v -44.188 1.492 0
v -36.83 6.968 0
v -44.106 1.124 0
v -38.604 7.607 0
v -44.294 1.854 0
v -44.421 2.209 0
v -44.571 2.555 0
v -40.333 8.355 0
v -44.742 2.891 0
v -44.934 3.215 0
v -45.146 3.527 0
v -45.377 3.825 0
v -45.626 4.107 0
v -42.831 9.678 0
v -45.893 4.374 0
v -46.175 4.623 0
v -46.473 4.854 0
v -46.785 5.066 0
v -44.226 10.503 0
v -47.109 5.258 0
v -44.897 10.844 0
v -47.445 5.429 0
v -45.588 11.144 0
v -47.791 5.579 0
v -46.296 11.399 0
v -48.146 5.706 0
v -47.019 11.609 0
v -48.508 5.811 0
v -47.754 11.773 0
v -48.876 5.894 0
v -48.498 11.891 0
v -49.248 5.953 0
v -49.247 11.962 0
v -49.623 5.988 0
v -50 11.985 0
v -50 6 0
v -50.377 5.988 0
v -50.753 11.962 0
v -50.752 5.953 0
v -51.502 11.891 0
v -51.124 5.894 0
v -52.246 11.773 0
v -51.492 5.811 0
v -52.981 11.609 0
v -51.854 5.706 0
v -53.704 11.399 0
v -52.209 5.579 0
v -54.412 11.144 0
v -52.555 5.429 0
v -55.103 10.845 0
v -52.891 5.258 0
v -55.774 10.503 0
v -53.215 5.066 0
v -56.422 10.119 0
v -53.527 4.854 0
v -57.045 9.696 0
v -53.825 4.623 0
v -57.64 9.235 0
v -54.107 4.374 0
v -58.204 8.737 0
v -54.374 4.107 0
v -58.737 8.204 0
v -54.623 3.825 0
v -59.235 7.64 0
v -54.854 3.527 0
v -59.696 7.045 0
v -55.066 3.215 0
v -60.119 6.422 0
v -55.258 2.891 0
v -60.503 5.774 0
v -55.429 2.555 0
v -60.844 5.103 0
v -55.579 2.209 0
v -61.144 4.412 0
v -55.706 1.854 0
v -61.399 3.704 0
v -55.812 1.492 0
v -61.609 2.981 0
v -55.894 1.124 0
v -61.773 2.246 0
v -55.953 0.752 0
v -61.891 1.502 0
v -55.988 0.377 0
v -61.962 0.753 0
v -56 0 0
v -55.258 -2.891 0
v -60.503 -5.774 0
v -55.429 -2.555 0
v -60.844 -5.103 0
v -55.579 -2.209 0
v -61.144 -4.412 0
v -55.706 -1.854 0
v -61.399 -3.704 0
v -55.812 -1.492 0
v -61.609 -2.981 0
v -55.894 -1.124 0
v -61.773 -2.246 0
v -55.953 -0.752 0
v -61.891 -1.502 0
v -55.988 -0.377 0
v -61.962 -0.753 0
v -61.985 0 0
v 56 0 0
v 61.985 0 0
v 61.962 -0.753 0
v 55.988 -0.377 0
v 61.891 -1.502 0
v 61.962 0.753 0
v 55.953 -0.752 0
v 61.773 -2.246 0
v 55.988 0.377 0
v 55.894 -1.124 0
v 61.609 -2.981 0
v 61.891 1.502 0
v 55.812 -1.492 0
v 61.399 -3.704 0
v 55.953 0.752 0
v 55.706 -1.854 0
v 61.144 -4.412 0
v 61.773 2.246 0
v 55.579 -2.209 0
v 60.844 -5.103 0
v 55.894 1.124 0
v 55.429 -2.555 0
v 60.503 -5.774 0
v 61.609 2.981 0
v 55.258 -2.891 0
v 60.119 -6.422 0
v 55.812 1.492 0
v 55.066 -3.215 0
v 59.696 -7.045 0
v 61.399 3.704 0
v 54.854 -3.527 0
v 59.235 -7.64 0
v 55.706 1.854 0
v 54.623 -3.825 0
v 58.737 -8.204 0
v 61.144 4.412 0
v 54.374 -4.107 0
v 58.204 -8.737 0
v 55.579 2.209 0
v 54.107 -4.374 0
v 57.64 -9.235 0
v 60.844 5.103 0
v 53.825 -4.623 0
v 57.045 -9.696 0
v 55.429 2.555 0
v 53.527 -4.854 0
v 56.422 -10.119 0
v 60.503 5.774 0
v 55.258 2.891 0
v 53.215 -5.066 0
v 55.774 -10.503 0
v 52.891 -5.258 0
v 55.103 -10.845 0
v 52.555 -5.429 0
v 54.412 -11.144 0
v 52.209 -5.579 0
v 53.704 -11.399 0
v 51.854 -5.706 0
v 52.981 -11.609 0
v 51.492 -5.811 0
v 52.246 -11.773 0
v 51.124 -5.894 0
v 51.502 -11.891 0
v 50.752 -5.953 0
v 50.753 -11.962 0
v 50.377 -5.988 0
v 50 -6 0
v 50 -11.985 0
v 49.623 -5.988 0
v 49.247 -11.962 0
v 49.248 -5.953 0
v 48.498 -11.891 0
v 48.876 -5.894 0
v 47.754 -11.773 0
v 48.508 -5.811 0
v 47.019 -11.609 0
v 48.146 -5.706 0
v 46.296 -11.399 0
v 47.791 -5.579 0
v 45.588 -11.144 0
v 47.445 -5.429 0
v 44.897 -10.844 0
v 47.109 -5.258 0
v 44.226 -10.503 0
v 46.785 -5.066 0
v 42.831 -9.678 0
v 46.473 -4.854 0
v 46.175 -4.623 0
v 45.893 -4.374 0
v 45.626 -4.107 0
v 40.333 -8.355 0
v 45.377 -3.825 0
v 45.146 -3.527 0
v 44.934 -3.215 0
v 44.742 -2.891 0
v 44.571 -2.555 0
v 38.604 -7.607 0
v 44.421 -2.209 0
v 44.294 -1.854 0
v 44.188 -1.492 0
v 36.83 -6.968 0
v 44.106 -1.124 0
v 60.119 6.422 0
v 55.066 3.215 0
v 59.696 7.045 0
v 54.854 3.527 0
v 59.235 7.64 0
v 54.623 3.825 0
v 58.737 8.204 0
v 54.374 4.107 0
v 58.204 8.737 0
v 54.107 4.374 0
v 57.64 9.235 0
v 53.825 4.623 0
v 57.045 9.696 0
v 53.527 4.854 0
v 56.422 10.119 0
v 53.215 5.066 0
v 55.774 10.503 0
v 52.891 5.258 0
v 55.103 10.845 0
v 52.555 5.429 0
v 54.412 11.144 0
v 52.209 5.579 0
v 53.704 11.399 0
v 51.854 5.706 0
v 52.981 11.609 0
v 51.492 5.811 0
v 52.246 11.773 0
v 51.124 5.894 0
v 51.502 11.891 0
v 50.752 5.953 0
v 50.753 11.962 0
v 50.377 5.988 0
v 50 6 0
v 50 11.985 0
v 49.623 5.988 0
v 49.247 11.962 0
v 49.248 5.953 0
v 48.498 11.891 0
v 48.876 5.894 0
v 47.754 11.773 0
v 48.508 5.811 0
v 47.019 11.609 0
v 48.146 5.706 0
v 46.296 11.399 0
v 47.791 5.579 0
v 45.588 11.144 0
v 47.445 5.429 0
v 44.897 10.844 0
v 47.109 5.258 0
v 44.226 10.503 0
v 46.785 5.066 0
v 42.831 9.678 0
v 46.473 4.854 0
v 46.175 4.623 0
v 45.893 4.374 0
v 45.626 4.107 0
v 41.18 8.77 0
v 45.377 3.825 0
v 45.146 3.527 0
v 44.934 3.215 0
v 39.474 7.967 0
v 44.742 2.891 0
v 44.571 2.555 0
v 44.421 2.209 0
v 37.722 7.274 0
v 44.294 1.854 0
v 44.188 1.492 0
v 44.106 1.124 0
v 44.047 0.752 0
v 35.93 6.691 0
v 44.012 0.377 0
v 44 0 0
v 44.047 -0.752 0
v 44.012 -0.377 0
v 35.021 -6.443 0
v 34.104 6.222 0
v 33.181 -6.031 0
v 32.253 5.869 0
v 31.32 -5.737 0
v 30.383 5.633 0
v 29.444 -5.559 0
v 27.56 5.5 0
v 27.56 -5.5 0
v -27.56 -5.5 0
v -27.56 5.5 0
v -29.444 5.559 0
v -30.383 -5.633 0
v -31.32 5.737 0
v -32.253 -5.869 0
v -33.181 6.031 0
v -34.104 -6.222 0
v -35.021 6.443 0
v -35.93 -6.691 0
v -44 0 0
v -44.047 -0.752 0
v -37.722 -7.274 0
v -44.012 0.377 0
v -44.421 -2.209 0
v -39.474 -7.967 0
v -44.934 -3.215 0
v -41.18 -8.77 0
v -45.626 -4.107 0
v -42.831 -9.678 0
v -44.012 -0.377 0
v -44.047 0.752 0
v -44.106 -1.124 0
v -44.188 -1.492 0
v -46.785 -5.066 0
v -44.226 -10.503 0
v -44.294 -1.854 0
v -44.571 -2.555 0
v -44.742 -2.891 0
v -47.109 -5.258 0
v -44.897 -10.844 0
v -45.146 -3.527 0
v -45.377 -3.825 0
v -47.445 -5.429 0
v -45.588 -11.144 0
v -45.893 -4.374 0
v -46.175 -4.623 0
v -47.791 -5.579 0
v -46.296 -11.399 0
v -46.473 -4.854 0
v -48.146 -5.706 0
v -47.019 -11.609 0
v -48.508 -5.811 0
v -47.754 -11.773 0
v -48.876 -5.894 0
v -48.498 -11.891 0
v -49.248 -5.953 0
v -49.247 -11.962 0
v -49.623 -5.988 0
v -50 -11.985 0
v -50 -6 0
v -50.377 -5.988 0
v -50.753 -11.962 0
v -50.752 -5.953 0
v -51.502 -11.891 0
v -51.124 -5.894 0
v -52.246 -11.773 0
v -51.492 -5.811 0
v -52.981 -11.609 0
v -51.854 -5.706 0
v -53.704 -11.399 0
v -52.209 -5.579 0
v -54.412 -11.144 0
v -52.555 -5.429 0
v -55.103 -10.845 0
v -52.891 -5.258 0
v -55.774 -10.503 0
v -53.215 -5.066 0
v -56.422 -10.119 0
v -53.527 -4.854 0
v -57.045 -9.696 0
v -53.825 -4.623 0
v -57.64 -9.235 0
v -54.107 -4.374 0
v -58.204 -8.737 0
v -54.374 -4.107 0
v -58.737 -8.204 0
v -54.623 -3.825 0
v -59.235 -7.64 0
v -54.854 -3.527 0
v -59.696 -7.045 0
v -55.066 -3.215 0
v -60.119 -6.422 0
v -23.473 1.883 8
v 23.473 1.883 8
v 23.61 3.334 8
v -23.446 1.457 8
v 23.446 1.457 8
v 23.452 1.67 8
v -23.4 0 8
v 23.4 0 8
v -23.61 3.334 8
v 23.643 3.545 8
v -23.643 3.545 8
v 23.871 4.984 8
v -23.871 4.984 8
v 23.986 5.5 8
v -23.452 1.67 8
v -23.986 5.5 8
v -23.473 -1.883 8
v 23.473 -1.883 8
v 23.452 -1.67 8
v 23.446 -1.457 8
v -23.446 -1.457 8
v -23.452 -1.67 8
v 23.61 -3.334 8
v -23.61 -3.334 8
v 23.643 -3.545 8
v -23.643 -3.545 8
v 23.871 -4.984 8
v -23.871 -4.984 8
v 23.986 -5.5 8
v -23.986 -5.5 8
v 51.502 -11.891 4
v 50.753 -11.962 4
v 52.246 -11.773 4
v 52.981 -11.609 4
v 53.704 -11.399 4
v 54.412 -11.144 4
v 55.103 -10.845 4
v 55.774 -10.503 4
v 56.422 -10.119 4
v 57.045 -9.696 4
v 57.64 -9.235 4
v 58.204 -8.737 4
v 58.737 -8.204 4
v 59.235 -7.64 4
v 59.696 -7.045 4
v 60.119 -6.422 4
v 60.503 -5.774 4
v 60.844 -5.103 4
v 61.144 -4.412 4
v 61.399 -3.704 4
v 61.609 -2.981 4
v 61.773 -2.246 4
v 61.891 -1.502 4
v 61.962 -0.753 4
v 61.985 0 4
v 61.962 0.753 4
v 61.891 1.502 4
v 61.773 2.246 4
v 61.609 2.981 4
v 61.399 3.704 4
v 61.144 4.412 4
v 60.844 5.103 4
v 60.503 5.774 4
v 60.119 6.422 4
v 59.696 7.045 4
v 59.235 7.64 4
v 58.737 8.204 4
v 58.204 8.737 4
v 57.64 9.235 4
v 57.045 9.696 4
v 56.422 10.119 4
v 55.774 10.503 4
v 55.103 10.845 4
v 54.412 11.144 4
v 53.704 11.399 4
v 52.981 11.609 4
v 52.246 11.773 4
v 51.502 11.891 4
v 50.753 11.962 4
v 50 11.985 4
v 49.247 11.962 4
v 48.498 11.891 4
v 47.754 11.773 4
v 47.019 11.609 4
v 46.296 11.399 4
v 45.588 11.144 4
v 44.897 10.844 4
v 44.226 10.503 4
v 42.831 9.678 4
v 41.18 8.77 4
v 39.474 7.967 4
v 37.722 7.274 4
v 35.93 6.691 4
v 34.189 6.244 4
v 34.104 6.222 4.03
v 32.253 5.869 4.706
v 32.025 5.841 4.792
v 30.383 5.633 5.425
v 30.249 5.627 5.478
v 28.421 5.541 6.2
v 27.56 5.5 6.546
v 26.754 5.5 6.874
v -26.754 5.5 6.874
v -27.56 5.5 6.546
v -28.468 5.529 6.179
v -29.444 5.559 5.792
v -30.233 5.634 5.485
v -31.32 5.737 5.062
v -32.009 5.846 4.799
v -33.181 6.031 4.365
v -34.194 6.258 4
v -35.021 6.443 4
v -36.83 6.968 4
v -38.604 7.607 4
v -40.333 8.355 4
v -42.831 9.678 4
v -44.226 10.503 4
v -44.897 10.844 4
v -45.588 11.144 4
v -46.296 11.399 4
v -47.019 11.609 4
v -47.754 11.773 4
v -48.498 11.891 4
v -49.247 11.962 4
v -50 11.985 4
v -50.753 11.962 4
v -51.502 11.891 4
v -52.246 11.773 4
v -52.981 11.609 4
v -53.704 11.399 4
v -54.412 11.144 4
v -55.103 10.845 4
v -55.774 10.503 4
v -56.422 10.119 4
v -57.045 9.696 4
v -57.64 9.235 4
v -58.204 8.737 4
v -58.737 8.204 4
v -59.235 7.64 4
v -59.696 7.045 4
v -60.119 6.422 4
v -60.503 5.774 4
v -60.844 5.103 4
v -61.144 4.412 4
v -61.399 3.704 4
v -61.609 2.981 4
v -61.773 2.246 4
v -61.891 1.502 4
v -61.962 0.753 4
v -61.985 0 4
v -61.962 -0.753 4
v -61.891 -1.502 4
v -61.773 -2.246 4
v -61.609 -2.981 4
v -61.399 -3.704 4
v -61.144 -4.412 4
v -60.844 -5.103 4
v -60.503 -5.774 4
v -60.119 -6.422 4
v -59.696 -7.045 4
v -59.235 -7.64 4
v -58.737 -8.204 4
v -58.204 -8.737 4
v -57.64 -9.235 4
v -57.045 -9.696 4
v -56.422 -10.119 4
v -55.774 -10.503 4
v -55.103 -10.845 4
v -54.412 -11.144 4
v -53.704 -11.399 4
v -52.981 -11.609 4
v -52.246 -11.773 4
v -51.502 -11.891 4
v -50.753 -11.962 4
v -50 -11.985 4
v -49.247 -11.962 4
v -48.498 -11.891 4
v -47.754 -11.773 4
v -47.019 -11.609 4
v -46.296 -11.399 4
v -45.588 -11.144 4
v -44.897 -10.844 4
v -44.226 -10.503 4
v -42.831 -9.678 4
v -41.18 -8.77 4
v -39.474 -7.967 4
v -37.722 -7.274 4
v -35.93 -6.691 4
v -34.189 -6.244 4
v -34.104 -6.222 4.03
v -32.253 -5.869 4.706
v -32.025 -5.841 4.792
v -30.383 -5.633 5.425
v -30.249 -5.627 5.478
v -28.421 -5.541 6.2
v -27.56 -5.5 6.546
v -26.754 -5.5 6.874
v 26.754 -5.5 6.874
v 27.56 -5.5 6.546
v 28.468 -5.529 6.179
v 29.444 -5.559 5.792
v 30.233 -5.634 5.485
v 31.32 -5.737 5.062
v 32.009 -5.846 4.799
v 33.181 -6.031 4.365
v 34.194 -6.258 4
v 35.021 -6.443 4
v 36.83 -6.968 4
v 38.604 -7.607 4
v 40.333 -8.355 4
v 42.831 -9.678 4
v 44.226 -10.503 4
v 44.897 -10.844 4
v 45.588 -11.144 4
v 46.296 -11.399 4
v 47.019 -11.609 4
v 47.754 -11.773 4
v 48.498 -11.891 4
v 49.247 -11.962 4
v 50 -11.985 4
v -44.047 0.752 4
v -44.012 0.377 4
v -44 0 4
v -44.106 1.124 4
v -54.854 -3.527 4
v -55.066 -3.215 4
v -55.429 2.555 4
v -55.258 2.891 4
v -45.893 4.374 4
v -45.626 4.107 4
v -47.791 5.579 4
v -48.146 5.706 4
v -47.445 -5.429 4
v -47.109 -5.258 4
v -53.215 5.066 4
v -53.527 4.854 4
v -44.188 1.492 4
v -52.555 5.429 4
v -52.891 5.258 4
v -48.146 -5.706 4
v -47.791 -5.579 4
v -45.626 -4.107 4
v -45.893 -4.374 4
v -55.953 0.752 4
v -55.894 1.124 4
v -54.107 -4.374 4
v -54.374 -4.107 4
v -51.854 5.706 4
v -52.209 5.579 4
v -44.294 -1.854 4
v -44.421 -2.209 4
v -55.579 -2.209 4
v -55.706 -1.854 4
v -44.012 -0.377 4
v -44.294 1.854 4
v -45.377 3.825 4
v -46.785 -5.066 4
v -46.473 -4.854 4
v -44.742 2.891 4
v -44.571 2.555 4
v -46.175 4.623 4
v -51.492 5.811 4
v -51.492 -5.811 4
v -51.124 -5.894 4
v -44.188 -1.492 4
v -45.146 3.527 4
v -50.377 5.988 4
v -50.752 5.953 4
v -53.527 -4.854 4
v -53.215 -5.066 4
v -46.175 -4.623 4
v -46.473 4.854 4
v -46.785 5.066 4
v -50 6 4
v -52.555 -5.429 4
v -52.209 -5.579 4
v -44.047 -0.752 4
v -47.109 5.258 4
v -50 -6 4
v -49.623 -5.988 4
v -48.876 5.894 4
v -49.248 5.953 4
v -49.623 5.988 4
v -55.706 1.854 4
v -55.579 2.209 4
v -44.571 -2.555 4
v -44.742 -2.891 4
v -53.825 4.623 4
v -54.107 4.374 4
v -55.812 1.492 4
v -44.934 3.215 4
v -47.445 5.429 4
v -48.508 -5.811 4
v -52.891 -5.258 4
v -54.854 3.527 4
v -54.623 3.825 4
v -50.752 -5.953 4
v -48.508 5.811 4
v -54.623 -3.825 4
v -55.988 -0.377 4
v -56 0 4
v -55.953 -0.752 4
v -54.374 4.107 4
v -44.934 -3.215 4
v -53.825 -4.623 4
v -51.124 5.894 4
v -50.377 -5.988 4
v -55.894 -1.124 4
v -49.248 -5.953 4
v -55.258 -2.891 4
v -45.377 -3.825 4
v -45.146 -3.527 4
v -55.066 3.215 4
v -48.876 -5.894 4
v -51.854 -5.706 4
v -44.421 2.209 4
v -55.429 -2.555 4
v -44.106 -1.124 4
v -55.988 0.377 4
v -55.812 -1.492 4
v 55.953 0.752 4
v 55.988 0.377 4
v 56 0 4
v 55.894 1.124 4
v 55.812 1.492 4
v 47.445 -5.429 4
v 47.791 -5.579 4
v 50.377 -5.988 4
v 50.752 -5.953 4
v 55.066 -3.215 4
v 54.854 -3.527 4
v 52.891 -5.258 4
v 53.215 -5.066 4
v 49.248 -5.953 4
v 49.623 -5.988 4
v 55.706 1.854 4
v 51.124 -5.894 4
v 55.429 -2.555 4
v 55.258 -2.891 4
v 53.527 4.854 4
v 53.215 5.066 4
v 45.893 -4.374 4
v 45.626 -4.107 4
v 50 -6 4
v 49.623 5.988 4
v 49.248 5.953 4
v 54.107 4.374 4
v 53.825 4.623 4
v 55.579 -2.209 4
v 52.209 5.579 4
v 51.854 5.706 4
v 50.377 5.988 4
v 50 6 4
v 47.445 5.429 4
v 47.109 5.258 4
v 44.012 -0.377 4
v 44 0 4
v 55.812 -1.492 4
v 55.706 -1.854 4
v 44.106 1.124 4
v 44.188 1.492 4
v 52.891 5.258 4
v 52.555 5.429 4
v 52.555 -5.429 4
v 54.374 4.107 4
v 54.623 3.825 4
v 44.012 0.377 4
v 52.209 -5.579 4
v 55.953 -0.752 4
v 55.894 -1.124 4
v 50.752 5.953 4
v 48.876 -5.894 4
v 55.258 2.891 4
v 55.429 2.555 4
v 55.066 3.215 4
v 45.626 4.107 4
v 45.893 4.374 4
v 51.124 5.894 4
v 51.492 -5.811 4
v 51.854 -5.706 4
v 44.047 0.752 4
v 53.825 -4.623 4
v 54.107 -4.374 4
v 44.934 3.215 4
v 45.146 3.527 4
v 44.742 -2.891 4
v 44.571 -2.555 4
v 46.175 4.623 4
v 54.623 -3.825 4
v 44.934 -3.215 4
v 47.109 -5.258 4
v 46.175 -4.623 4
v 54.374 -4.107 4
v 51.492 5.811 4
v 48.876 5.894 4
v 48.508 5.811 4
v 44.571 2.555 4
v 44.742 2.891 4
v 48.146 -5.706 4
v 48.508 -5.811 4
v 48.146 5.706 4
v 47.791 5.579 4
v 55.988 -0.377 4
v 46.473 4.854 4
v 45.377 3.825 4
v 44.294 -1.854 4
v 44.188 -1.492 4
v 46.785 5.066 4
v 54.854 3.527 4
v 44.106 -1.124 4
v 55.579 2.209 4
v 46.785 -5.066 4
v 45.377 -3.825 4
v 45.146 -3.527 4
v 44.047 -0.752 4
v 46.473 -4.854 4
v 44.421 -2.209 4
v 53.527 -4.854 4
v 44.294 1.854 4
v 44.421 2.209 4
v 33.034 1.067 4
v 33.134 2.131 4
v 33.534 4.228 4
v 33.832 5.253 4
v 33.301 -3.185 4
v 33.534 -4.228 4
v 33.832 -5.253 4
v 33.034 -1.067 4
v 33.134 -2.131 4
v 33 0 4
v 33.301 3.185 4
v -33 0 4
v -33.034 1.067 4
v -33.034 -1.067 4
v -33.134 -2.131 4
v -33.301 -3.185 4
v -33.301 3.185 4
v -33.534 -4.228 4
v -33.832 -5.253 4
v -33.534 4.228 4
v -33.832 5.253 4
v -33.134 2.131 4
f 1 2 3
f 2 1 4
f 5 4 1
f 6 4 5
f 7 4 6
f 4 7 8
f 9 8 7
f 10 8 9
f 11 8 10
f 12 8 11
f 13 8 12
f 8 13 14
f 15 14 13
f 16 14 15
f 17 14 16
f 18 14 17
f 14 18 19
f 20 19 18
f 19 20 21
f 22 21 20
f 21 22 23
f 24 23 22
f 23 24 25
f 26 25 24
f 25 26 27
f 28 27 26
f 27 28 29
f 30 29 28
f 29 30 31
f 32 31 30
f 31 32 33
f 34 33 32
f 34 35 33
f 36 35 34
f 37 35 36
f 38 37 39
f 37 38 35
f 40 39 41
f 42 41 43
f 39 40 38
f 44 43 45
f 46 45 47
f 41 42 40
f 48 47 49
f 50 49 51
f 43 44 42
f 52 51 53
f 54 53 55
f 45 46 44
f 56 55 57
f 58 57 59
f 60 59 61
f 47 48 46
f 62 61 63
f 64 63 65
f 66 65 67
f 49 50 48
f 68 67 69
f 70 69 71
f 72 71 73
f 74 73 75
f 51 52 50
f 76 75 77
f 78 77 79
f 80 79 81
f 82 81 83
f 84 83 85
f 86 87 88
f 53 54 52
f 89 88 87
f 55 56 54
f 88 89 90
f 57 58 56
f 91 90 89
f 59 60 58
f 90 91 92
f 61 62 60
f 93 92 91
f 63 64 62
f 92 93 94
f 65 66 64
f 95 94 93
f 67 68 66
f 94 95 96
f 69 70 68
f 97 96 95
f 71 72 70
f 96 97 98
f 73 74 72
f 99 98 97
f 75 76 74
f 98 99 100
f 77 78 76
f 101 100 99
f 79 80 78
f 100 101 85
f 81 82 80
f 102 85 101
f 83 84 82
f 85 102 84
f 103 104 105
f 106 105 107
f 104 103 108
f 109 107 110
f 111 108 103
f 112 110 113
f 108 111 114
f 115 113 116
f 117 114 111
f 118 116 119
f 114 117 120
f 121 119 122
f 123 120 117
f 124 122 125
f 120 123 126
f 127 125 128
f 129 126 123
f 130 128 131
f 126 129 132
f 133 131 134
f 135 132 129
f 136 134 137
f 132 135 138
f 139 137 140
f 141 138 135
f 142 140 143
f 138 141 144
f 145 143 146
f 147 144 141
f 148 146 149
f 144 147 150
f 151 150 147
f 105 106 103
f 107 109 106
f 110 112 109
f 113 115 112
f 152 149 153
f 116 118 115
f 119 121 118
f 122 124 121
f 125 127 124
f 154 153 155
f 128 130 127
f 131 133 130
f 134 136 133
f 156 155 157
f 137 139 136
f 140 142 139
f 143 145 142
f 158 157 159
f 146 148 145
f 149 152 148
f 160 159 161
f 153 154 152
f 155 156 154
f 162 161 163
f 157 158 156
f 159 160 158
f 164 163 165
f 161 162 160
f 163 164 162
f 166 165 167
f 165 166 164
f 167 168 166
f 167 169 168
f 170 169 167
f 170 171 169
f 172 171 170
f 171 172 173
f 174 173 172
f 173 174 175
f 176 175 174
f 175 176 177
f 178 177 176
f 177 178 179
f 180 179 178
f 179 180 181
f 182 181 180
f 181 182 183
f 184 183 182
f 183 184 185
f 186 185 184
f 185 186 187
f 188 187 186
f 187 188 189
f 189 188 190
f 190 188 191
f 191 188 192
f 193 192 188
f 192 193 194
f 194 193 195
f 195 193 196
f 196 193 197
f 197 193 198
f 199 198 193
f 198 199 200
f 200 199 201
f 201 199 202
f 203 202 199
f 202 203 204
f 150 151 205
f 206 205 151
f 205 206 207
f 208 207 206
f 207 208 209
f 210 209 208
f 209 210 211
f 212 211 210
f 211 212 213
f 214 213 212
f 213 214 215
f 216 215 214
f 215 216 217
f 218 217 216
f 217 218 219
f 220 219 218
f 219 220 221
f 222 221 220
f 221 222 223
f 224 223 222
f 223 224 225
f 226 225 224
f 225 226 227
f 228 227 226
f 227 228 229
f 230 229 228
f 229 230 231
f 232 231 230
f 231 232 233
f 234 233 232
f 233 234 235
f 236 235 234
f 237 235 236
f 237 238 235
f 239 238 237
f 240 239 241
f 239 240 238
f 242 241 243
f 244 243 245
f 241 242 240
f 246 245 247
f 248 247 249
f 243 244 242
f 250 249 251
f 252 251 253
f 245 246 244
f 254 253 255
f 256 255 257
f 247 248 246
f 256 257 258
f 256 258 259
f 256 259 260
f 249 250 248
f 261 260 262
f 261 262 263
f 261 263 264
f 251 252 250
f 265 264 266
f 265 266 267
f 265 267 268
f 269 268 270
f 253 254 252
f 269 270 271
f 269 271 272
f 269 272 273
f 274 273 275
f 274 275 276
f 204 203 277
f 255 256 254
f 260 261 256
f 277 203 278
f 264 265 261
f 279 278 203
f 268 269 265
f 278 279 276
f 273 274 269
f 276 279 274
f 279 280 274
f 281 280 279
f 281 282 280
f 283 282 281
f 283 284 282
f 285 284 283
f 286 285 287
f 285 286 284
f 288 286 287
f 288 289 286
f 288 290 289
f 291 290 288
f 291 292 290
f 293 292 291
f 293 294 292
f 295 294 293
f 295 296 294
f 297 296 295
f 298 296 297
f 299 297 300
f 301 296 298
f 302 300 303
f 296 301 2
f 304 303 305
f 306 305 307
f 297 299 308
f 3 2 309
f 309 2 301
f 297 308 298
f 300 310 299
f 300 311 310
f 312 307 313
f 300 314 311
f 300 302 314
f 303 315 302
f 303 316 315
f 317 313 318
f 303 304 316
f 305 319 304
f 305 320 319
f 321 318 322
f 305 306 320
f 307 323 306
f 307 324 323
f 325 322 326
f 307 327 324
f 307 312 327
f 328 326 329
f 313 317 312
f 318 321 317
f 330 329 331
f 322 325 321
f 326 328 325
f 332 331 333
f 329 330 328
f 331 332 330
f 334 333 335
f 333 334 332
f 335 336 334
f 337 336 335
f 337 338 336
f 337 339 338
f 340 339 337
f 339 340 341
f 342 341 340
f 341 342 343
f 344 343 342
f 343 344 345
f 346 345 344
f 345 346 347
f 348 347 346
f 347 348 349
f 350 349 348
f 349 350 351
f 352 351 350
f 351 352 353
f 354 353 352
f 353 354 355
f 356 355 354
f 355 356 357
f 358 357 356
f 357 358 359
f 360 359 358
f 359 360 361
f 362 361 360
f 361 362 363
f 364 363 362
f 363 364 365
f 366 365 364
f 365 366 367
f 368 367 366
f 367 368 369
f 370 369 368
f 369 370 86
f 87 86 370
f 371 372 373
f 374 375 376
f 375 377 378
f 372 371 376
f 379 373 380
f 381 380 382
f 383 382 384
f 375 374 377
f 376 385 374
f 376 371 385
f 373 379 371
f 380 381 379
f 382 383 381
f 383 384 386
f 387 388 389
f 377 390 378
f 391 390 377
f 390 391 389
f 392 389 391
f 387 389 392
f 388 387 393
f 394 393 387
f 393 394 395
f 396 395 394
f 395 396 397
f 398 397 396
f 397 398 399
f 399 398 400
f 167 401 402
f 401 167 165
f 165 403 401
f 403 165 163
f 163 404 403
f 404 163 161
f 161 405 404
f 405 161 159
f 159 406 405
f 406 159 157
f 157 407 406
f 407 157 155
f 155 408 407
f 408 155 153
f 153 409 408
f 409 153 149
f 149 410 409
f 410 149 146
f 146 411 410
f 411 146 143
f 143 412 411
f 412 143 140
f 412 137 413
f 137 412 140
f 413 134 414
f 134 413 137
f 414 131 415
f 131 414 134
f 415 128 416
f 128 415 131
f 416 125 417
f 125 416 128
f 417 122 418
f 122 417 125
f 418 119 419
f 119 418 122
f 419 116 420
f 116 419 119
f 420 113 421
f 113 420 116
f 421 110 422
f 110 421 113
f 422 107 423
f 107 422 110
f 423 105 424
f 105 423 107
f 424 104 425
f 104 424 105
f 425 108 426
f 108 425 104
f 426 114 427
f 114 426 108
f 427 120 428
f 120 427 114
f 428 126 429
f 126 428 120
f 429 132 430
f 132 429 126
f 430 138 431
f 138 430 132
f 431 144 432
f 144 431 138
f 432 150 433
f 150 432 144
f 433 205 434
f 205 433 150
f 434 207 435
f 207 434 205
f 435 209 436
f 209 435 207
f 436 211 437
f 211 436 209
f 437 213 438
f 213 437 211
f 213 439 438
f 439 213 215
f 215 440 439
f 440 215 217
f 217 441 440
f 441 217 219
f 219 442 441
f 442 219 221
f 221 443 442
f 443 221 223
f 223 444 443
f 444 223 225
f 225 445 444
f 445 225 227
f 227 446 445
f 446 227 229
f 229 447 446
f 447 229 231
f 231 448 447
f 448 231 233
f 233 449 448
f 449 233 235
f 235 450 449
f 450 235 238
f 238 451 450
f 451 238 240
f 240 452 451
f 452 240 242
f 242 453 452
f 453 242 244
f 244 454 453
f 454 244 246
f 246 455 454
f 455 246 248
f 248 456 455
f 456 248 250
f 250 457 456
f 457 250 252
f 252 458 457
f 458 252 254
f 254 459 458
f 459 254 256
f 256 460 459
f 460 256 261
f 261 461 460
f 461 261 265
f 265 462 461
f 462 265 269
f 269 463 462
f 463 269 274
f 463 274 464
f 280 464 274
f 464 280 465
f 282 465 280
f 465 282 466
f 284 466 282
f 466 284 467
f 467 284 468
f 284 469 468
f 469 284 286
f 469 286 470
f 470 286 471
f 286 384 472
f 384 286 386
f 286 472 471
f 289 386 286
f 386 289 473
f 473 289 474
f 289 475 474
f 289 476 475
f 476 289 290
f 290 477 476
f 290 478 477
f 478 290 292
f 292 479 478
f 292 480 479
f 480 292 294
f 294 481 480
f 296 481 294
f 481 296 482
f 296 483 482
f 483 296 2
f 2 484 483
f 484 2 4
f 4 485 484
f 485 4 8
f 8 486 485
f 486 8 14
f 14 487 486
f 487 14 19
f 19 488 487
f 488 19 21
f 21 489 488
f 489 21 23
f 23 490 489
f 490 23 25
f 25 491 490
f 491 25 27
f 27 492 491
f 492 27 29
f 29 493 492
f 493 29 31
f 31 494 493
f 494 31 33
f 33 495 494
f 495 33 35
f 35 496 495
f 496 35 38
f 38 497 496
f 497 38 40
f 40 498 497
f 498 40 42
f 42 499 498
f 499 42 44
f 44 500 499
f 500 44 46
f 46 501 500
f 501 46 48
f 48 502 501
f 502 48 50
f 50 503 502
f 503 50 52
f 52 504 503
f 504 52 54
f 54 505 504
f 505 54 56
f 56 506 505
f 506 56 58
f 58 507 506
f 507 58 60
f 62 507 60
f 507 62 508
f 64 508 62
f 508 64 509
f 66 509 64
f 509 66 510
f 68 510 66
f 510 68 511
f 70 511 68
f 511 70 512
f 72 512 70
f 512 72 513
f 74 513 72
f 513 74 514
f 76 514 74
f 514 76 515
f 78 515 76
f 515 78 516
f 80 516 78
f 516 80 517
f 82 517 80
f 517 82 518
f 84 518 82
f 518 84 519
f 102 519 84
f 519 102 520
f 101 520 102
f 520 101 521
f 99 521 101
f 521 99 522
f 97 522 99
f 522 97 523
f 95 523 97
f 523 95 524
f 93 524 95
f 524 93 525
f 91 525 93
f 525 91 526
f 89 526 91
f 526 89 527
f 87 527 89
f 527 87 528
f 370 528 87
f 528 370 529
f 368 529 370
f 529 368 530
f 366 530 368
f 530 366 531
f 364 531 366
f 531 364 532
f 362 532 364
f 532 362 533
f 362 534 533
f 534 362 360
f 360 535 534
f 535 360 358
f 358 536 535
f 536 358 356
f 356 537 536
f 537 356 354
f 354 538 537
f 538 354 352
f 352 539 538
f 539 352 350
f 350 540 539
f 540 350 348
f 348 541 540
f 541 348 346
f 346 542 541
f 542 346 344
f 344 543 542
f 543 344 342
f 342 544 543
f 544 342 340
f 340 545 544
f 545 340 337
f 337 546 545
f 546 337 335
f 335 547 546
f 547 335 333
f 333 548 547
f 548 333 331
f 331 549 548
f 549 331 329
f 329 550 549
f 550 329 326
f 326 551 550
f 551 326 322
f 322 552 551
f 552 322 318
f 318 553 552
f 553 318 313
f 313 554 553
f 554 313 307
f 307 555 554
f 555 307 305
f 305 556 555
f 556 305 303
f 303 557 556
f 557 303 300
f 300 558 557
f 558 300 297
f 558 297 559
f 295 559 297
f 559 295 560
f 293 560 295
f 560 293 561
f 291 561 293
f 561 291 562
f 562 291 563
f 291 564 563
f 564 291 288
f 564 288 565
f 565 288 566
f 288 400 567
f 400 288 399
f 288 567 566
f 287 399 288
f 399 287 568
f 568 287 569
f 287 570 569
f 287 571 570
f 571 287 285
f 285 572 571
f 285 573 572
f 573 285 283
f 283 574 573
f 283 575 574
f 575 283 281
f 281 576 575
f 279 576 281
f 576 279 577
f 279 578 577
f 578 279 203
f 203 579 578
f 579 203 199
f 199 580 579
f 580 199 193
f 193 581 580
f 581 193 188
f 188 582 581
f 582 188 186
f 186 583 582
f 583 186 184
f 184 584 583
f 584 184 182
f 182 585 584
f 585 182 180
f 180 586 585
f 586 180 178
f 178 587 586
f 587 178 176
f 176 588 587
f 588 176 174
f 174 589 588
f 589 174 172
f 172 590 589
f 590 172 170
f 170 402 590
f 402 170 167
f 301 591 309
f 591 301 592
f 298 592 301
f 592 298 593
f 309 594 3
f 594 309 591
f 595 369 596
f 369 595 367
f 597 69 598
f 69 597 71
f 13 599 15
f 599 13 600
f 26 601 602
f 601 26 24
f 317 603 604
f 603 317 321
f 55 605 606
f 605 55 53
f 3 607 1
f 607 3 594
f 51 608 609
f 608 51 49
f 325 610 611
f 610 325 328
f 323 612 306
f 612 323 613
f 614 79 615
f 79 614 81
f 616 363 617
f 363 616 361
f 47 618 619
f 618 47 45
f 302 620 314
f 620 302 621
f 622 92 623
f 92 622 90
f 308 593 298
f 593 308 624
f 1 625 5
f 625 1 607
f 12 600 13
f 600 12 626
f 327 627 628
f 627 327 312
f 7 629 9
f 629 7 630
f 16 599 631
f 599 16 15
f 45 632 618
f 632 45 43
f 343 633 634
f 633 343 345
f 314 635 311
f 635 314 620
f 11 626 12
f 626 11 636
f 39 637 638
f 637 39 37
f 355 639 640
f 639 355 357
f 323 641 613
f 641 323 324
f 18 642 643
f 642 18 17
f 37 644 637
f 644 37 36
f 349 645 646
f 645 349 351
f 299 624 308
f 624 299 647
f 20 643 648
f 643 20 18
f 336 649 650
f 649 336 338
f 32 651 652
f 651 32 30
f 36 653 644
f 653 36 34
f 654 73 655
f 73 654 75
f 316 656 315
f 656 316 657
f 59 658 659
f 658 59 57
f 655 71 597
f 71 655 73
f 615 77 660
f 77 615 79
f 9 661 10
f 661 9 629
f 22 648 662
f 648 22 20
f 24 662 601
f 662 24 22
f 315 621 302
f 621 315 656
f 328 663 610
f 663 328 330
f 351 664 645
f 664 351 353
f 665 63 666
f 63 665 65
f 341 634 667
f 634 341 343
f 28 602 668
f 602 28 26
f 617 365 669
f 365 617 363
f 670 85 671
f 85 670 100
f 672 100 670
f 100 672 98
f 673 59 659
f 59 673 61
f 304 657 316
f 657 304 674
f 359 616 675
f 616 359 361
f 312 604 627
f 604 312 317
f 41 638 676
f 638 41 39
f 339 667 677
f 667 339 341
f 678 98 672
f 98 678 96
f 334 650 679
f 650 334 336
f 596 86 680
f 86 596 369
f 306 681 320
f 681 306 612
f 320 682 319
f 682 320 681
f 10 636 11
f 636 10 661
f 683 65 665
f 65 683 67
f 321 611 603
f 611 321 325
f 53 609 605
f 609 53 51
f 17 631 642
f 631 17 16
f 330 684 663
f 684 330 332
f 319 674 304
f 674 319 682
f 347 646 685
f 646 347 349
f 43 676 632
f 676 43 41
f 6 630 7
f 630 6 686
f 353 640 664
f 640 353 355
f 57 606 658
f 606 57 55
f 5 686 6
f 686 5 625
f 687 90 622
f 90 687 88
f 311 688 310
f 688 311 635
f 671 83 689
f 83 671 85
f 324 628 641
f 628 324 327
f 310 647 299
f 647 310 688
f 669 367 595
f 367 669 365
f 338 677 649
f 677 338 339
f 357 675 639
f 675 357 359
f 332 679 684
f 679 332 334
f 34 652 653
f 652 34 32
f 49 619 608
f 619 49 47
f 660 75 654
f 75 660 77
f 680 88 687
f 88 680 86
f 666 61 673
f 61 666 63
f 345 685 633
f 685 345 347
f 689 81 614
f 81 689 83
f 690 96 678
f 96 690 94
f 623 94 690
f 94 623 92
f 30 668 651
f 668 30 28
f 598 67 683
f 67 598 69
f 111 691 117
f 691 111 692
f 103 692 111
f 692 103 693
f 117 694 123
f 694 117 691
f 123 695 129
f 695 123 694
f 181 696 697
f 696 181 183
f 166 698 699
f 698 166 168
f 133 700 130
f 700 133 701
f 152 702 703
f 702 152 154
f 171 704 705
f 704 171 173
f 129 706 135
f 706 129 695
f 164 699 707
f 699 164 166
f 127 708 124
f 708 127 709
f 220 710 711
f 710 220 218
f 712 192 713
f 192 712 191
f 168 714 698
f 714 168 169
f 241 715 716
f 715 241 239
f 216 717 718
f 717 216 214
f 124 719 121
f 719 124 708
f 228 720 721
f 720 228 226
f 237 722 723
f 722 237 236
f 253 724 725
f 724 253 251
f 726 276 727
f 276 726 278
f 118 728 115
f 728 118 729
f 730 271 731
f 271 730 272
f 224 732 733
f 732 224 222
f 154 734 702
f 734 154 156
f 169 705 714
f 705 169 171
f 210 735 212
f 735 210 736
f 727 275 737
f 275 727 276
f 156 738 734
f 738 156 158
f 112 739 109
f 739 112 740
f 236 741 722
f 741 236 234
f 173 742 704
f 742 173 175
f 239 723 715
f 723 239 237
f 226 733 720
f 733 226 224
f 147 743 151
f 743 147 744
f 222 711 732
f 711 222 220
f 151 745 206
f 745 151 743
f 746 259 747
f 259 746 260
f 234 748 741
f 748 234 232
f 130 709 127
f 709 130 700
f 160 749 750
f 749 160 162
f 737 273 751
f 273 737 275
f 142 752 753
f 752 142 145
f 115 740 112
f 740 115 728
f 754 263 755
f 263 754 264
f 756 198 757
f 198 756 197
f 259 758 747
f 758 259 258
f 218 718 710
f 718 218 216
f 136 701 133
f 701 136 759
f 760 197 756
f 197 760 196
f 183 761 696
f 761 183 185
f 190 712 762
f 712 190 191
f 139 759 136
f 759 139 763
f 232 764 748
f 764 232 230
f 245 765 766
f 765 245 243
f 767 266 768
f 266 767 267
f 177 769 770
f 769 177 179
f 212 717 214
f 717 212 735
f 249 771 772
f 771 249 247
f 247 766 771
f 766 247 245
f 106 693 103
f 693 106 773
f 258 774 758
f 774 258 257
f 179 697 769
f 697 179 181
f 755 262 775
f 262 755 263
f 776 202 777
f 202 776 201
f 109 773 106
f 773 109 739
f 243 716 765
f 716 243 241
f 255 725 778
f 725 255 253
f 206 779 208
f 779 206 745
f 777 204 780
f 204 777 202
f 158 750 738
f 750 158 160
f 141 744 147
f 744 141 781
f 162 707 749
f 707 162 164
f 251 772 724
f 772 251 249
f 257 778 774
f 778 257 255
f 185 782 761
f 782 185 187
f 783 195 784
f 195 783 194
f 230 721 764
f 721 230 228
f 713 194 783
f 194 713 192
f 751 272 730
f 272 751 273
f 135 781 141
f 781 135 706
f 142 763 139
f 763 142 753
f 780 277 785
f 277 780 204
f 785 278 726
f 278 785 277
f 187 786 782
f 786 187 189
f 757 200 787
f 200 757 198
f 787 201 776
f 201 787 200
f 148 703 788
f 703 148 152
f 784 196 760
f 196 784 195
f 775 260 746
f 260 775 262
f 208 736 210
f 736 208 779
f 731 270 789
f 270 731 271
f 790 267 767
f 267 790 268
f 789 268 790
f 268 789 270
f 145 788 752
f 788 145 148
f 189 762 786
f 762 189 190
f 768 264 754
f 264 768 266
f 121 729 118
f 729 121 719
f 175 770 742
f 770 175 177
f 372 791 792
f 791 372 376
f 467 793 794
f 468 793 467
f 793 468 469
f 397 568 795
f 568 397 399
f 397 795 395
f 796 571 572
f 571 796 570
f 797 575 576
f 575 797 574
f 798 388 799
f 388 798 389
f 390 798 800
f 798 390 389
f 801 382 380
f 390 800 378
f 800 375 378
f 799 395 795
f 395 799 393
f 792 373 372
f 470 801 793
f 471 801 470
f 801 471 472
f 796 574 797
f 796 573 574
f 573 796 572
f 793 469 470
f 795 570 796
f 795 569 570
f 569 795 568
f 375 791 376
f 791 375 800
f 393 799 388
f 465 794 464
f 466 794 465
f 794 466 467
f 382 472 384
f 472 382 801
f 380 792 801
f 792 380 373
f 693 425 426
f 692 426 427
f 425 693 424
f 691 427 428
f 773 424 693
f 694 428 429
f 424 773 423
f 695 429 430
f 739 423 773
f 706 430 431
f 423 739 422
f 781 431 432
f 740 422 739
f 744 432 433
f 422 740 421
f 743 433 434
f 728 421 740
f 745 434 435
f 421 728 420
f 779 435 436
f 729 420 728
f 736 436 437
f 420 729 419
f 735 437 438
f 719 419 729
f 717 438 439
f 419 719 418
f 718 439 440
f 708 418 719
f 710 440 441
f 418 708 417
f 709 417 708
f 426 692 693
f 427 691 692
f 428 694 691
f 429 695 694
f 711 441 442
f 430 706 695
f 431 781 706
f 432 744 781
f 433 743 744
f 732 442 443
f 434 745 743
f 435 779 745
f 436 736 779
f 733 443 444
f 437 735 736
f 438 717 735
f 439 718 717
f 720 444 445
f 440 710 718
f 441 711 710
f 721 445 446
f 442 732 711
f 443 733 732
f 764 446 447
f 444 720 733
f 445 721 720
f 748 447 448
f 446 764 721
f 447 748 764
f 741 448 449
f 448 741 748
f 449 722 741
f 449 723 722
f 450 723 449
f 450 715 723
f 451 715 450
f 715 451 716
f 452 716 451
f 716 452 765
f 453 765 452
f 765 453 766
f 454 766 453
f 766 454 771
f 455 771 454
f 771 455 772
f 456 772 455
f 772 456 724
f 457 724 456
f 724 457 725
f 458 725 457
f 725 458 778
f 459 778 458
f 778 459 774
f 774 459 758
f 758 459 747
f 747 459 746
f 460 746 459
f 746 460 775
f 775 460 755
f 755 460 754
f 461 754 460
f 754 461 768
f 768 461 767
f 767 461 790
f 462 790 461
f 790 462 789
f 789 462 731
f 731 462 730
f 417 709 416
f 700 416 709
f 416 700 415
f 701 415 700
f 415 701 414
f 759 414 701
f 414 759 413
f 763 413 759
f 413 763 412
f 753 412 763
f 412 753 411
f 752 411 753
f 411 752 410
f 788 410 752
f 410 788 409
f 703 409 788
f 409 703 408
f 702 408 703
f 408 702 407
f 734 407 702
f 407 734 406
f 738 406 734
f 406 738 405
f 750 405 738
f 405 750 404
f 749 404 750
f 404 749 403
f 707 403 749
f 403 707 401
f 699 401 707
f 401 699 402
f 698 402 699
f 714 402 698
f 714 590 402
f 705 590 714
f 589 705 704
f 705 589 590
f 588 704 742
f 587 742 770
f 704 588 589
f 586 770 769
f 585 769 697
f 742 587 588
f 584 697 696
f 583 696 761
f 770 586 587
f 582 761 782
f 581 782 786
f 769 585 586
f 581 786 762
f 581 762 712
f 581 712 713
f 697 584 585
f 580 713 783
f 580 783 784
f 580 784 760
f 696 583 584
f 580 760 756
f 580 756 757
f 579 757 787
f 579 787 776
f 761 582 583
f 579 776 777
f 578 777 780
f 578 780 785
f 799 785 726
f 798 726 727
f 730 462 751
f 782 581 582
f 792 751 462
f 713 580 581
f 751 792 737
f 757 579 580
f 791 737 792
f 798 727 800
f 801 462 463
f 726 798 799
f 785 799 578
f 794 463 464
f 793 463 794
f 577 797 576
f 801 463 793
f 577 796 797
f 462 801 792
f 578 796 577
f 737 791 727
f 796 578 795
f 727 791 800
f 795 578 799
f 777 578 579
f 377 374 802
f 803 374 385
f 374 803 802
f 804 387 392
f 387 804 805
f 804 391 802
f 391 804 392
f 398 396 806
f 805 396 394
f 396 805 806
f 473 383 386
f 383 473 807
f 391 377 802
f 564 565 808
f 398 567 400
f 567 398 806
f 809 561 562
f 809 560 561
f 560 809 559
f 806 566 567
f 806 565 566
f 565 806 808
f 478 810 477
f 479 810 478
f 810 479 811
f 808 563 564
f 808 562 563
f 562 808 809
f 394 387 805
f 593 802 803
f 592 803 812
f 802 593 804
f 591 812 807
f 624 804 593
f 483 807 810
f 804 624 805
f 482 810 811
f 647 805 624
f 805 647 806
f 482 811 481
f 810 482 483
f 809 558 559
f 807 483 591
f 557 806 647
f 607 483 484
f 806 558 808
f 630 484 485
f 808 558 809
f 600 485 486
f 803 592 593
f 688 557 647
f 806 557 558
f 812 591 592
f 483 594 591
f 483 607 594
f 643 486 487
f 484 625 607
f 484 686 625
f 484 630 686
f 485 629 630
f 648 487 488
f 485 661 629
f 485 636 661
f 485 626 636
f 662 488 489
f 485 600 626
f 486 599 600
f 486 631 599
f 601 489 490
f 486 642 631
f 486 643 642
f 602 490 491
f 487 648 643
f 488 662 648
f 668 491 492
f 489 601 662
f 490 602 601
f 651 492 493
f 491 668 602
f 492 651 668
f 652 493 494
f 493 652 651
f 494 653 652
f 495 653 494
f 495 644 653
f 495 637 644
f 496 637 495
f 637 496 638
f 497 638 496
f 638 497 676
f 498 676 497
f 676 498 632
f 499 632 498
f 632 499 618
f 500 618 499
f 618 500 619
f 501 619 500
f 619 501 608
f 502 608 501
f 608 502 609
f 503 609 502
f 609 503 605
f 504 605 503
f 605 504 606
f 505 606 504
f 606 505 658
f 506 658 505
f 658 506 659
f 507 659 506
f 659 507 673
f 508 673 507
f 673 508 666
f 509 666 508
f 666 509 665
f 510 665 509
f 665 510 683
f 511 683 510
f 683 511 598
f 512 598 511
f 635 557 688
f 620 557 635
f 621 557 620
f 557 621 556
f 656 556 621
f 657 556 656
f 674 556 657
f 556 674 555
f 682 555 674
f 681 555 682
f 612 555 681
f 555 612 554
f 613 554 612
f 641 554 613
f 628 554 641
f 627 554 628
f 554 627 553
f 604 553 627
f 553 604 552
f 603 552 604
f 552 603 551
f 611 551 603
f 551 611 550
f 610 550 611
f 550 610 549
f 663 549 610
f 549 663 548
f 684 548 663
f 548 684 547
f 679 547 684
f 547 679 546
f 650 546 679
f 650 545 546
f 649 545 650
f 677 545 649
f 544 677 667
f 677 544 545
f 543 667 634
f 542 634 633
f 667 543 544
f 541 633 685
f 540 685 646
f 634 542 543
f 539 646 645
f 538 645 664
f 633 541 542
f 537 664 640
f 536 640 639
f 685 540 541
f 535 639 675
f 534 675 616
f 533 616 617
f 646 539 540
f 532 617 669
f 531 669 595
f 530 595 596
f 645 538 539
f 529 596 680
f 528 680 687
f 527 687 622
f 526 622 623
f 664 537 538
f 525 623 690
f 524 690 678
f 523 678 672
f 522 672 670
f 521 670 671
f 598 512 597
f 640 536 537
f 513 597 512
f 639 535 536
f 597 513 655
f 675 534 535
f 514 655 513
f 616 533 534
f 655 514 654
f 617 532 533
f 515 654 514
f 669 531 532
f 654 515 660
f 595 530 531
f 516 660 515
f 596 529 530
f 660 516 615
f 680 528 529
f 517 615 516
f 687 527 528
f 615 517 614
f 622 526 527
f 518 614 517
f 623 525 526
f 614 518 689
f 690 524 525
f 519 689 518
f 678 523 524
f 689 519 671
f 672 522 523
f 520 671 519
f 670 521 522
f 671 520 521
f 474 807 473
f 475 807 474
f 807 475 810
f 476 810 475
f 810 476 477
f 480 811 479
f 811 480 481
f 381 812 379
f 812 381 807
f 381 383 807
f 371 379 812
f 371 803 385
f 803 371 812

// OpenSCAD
//parameters

cuts_outs=1;//1=cutouts 0=no cutouts
pivots=0;//1=with pivots 0=no pivoits


$fn=100;
hole_dia=12;
blend_rad=30;//default 30
link_width=11;
hole_center=100;
link_thickness=8;
bonerad=12;
//

width=link_width+(blend_rad*2);
bonerad2=bonerad+blend_rad;
hole_rad=hole_dia/2;


module link () {
union(){
cube([hole_center,width,1],center=true);
translate([-hole_center/2,0,-2.5]) cylinder(  5, bonerad2, bonerad2,false);
translate([hole_center/2,0,-2.5]) cylinder(  5, bonerad2, bonerad2,false);
}
}

module dlink () {
offset(r=-blend_rad) projection(cut = false) link ();
}
difference(){
        linear_extrude(0,0,link_thickness) dlink ();
        translate([-hole_center/2,0,-5])cylinder(link_thickness+10,hole_rad,hole_rad,false);
        translate([hole_center/2,0,-5])cylinder(link_thickness+10,hole_rad,hole_rad,false);
            
        if (cuts_outs==1) translate([hole_center/2,0,link_thickness/2])cylinder((link_thickness/2)+1,bonerad+5,bonerad+17,false);
        if (cuts_outs==1) translate([-hole_center/2,0,link_thickness/2])cylinder((link_thickness/2)+1,bonerad+5,bonerad+17,false);
 }


if (pivots==1) translate([-hole_center/2,0,0])cylinder(link_thickness,hole_rad,hole_rad,false);
if (pivots==1) translate([hole_center/2,0,0])cylinder(link_thickness,hole_rad,hole_rad,false);
